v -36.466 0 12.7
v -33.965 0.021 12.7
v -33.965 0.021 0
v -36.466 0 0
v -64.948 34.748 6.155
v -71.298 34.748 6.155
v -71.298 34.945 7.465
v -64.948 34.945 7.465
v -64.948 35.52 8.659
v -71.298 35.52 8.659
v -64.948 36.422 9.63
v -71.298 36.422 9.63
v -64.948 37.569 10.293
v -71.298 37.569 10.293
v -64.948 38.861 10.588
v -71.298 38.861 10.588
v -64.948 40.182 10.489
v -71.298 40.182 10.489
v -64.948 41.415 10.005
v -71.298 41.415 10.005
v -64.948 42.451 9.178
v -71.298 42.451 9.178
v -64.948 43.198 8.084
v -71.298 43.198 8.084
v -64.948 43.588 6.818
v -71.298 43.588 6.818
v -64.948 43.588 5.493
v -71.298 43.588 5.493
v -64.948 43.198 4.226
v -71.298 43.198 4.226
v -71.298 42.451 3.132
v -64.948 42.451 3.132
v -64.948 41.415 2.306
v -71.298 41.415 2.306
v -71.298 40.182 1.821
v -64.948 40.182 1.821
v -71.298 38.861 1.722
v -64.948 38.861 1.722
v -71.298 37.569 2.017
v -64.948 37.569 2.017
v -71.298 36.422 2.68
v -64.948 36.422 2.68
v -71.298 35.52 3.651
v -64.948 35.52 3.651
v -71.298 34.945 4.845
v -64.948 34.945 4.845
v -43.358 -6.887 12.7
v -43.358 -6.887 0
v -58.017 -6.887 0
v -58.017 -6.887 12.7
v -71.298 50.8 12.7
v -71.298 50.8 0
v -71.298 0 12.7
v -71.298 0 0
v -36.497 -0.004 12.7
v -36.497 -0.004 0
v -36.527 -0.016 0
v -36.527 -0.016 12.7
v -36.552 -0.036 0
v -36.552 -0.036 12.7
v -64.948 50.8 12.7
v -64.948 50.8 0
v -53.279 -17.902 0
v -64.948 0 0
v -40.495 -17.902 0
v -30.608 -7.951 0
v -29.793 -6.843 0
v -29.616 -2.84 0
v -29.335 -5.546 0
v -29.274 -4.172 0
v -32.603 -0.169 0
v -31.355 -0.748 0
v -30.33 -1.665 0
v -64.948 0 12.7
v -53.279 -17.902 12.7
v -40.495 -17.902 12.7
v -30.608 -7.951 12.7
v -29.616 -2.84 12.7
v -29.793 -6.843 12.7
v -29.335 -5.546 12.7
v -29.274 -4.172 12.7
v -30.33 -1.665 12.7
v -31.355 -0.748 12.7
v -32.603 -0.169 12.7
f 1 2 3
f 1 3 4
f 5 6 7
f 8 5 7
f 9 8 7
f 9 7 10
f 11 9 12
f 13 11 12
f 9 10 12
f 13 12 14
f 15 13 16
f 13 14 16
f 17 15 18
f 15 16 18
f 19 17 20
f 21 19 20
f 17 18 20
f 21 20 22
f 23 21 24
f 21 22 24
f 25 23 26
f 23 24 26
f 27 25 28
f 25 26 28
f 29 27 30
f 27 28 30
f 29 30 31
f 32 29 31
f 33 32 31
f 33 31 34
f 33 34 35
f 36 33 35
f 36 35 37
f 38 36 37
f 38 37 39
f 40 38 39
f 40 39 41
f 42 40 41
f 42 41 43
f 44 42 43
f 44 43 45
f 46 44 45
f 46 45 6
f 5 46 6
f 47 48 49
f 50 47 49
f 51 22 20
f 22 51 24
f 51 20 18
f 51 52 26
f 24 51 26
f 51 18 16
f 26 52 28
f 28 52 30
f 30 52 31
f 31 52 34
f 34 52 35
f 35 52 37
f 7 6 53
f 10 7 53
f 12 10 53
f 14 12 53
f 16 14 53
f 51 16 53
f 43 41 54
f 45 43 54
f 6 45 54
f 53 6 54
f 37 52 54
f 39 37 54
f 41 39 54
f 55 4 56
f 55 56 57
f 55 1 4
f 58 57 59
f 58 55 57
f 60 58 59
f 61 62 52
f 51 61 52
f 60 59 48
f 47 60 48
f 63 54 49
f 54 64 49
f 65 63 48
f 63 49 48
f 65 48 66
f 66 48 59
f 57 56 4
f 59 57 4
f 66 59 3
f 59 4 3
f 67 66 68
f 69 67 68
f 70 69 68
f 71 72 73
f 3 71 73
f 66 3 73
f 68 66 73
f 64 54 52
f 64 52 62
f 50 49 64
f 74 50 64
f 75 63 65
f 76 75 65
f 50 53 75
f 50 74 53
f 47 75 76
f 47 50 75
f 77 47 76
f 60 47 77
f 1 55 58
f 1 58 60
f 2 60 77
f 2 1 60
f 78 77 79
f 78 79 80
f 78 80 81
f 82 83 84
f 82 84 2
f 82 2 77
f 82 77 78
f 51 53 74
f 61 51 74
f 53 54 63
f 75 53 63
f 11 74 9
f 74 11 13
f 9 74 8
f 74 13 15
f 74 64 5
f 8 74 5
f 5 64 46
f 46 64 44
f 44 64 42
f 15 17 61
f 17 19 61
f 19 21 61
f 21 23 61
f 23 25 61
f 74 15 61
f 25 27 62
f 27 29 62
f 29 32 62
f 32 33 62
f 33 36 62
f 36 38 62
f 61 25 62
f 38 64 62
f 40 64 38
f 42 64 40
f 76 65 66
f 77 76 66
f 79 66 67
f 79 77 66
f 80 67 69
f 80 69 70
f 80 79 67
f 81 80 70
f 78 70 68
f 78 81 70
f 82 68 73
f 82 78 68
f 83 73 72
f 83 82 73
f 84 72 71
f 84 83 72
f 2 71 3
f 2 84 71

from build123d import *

# Parameters (mm, degrees)
F1_DEPTH = 12.7
F2_R     = 4.6763821429
F3_R     = 0.12308652
F5_D     = 8.89


with BuildPart() as f1:
    # F0 (on Top) → F1 (new body)
    with BuildSketch(Plane.XY):
        Polygon((-64.9482621324, 50.8), (-71.2982621324, 50.8), (-71.2982621324, 0), (-53.2793551183, -17.9019269917), (-40.4947772622, -17.9019269917), (-22.5928502705, 0.1169800224), (-36.5162245659, 0), (-43.3580465615, -6.8865298358), (-58.0167323134, -6.8865298358), (-64.9482621324, 0), align=None)
    extrude(amount=F1_DEPTH)

    # F2
    f2_edges = [f1.edges().sort_by_distance(p)[0] for p in [
        (-22.59285, 0.11698, 6.35),
    ]]
    fillet(f2_edges, radius=F2_R)

    # F3
    f3_edges = [f1.edges().sort_by_distance(p)[0] for p in [
        (-33.964892, 0.021436, 6.35),
        (-36.516225, 0, 6.35),
    ]]
    fillet(f3_edges, radius=F3_R)

    # F5 (through all)
    with Locations(Plane.YZ):
        with Locations((39.1929335892, 6.155018229)):
            Hole(F5_D / 2)


solid = f1.part
